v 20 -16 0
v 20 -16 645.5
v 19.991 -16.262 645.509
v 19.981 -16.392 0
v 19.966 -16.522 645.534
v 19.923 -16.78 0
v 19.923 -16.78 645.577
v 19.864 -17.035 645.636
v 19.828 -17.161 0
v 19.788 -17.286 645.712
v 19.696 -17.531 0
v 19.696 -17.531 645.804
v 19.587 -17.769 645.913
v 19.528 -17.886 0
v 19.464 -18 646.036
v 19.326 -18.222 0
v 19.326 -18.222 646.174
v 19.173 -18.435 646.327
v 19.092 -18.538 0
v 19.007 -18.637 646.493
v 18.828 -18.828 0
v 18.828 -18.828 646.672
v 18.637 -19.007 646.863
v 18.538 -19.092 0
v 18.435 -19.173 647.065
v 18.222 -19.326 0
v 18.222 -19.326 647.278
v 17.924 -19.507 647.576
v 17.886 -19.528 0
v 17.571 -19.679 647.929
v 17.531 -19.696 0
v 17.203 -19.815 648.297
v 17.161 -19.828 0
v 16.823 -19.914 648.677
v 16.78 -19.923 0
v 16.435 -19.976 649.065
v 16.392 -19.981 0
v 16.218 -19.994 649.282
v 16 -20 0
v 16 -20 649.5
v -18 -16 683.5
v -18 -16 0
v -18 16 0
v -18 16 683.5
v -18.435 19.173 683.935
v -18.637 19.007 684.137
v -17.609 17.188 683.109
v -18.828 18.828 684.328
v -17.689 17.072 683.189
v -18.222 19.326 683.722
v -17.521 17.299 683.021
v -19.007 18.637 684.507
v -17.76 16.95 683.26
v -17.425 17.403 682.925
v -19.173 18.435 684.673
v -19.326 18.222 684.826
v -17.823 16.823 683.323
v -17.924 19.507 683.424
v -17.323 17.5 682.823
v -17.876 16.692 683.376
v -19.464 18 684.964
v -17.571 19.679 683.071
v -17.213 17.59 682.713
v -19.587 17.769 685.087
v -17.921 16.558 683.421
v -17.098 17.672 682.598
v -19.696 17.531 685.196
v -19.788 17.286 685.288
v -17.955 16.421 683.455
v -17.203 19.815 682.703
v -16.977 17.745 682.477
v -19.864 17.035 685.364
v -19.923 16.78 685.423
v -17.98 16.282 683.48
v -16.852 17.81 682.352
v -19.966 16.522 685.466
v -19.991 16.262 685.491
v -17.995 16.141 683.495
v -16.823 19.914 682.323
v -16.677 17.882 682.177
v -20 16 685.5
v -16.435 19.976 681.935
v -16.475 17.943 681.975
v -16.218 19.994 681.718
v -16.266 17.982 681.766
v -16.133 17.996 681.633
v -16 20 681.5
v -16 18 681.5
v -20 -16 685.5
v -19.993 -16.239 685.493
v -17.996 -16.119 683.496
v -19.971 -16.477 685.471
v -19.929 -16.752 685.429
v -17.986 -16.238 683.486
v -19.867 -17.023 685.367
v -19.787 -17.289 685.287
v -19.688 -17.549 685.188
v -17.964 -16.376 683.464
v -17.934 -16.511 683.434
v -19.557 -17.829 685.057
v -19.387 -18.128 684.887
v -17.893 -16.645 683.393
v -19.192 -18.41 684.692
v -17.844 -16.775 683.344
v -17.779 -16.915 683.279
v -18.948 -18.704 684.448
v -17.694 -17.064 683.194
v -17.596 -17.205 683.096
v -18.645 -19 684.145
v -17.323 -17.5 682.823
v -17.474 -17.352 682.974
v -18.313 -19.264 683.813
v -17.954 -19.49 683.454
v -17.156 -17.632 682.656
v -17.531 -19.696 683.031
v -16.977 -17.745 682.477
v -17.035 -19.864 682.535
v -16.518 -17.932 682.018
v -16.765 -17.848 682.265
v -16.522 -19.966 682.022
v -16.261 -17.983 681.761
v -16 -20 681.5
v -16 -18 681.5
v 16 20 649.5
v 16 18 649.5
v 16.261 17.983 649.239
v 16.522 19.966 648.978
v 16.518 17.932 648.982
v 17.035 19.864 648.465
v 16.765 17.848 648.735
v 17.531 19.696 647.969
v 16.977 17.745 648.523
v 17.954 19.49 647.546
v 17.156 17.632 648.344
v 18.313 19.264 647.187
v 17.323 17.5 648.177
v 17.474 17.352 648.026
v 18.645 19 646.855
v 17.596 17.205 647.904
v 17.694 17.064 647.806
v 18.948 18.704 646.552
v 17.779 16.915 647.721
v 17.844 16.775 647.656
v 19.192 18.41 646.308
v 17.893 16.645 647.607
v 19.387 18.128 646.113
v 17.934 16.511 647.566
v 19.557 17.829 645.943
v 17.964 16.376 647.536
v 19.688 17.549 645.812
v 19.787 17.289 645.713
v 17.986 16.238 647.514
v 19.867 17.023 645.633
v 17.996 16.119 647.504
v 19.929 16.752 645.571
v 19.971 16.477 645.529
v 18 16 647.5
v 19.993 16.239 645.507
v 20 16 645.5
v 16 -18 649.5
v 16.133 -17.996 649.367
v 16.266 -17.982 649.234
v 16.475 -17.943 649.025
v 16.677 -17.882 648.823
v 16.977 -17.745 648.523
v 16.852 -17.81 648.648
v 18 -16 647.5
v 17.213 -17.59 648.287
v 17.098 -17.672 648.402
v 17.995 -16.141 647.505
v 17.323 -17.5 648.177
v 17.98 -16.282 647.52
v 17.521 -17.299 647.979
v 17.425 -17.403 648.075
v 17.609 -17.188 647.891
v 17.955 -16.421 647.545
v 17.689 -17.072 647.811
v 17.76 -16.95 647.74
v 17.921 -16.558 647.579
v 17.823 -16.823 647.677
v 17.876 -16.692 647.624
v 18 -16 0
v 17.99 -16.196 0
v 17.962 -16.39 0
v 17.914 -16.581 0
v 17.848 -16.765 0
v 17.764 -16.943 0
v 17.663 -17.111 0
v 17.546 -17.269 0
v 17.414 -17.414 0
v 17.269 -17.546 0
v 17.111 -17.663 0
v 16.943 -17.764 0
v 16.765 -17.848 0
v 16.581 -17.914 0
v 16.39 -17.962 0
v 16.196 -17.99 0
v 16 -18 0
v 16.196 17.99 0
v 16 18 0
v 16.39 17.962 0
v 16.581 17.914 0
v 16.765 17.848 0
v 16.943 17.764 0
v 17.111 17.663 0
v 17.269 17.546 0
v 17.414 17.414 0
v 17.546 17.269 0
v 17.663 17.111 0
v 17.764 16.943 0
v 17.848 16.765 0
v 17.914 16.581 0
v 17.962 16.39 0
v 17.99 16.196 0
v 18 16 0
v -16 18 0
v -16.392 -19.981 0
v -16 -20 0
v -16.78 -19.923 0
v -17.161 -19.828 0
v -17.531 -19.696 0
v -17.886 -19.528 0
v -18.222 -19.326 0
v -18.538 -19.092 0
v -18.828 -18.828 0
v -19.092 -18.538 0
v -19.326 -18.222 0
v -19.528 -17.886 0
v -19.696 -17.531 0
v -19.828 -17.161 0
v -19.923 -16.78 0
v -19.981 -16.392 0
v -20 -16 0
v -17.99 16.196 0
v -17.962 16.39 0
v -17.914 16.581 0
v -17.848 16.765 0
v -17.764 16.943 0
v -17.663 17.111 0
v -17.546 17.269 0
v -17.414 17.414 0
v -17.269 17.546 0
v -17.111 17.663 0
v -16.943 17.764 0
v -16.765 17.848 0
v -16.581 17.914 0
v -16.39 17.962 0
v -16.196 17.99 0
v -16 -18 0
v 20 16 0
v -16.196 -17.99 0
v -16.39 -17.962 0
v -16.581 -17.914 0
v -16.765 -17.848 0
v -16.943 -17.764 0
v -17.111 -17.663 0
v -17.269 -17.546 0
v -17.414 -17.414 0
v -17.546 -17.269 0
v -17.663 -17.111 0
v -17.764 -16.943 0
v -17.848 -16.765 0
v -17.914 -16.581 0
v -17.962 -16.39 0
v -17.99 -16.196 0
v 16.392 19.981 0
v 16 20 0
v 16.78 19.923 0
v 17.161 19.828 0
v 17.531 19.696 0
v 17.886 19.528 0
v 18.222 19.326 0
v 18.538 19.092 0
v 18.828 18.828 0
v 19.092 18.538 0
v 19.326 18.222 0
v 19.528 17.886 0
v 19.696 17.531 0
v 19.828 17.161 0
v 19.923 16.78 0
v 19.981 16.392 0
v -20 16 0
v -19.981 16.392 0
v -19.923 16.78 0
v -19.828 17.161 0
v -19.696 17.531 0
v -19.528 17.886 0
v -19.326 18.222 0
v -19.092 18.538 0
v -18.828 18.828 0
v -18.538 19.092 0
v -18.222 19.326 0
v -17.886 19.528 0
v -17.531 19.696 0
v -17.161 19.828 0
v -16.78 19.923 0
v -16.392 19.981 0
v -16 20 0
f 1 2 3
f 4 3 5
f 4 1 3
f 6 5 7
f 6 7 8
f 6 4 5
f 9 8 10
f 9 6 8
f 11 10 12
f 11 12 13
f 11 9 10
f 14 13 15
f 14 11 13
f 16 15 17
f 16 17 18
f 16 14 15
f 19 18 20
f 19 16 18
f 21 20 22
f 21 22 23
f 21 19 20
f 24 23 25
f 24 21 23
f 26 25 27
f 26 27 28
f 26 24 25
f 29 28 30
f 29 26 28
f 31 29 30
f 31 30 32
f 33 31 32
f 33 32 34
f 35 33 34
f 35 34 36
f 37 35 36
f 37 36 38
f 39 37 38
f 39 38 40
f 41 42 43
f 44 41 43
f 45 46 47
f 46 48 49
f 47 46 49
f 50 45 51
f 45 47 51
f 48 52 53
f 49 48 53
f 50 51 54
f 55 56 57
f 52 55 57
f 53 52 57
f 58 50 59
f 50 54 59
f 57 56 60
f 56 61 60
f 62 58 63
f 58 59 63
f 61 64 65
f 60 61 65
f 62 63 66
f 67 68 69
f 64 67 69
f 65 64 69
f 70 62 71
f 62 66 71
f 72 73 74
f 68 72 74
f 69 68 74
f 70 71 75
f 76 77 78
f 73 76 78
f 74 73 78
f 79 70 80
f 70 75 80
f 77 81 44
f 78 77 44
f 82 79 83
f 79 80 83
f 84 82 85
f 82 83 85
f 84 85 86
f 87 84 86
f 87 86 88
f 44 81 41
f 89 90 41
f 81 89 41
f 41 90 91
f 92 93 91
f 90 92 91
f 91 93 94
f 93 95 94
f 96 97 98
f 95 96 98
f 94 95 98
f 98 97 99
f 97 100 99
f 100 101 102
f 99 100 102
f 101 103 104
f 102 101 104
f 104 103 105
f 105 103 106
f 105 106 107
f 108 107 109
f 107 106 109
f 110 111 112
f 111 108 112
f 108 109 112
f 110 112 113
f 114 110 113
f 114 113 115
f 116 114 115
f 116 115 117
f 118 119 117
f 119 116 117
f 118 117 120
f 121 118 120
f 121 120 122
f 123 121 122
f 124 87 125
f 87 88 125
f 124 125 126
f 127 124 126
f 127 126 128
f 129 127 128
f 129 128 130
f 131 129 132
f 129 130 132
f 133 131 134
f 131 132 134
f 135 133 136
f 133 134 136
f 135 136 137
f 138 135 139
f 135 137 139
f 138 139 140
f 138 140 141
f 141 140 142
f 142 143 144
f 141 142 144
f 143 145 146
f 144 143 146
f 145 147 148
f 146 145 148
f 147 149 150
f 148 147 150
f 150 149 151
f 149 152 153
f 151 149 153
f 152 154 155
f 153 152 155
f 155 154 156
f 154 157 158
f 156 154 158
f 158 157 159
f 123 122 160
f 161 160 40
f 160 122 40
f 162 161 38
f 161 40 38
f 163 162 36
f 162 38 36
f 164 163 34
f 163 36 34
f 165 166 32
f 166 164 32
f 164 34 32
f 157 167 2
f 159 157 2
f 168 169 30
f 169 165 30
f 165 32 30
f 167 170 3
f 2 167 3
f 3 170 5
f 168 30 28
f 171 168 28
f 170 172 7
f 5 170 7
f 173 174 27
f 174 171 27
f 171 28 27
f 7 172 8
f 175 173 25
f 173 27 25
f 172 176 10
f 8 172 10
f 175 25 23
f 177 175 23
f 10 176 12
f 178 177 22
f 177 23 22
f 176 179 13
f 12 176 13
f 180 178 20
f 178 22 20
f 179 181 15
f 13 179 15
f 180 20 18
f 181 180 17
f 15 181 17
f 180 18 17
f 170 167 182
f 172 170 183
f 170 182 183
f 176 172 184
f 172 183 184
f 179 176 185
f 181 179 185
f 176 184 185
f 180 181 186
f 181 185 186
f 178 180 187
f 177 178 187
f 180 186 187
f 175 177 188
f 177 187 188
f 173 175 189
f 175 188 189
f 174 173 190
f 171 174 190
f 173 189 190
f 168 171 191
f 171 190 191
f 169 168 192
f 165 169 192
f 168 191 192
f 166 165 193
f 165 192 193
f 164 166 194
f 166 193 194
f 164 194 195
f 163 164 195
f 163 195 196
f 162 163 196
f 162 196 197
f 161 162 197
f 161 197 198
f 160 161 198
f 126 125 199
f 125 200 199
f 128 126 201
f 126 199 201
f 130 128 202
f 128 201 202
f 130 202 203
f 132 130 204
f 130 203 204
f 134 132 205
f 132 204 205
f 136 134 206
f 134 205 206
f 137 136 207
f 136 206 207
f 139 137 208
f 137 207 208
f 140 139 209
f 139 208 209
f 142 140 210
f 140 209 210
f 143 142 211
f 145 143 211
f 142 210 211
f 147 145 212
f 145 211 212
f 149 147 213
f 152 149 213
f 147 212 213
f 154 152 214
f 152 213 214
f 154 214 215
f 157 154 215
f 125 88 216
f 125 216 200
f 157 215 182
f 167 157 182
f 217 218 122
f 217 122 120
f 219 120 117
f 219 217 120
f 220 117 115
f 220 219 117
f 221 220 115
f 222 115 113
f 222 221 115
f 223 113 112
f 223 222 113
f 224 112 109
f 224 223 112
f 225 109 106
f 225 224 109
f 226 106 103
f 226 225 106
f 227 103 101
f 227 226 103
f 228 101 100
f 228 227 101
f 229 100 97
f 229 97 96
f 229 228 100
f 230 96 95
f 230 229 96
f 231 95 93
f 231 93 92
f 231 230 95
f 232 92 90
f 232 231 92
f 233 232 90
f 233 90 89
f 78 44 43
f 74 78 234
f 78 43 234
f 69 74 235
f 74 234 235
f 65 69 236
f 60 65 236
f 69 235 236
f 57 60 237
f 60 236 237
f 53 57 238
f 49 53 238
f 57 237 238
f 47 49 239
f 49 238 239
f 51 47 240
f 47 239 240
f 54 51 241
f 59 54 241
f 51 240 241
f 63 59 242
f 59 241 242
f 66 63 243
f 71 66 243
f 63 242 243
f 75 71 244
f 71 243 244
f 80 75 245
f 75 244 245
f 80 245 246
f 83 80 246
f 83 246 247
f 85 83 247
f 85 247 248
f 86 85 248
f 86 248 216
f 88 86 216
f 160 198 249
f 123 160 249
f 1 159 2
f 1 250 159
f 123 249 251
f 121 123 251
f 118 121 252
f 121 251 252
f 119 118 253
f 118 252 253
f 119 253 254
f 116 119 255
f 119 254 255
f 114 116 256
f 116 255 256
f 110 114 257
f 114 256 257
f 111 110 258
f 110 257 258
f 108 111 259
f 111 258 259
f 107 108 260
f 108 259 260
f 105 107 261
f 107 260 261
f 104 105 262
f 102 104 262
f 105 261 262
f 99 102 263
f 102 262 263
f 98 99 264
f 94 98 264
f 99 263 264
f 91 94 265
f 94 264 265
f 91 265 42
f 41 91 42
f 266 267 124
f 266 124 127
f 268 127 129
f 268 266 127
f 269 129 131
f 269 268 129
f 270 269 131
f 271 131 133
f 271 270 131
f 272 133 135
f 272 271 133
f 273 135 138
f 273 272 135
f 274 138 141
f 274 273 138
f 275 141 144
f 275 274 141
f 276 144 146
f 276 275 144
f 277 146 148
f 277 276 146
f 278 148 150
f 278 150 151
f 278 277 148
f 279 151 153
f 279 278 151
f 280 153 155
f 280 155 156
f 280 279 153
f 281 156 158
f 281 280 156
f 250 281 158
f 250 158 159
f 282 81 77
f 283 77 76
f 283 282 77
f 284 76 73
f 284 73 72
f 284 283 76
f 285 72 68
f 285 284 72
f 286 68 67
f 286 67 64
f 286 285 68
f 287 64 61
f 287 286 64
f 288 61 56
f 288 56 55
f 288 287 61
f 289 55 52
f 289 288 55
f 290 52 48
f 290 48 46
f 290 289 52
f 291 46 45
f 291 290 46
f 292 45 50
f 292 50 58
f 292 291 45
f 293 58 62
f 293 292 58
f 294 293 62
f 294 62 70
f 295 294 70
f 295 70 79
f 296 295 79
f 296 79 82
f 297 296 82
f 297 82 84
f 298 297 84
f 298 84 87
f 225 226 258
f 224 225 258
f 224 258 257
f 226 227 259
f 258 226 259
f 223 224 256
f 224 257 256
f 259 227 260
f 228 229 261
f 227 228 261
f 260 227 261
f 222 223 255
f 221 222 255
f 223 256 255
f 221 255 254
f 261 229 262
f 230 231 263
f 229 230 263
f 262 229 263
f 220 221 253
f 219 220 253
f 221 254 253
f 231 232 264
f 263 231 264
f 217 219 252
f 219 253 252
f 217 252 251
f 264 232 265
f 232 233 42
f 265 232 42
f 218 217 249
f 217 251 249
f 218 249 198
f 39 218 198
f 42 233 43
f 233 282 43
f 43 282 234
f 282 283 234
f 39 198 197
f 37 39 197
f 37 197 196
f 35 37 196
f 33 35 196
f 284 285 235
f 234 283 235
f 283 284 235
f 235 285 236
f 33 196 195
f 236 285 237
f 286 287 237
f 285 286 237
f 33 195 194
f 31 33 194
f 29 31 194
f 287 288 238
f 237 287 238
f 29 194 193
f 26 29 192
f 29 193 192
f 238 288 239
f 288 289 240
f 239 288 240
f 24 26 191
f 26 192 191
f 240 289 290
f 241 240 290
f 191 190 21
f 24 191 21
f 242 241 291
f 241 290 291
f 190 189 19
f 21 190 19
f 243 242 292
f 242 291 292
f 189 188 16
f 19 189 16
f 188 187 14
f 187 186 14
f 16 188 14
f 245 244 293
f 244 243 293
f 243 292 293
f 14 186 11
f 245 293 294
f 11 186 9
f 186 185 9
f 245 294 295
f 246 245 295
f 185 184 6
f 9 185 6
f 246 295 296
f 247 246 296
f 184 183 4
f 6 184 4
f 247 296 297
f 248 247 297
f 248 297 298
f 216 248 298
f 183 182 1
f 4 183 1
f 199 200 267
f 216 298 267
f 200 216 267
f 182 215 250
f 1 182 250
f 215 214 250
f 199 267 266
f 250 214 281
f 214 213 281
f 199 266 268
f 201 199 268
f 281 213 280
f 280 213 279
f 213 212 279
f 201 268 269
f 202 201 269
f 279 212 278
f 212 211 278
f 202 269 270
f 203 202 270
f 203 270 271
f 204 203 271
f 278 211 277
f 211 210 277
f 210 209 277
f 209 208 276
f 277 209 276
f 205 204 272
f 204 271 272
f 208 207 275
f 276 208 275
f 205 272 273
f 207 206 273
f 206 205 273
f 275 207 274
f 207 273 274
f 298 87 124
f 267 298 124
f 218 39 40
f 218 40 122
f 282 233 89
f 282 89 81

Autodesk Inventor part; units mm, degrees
ref_plane "YZ Plane" through (0, 0, 0) normal (1, 0, 0) x (0, 1, 0)
ref_plane "Piano iniziale" through (0, 0, 0) normal (0, 0, 1) x (1, 0, 0)
ref_plane "Piano finale" through (0, 0, 685.5) normal (0, 0, 1) x (1, 0, 0)
sketch "Schizzo" plane through (0, 0, 0) normal (0, 0, 1) x (1, 0, 0)
  line L0 (-20, -16) -> (-20, 16)
  line L1 (-16, 20) -> (16, 20)
  line L2 (20, 16) -> (20, -16)
  line L3 (16, -20) -> (-16, -20)
  arc A0 (-20, -16) -> (-16, -20) centre (-16, -16) ccw
  arc A1 (20, 16) -> (16, 20) centre (16, 16) ccw
  arc A2 (-16, 20) -> (-20, 16) centre (-16, 16) ccw
  arc A3 (16, -20) -> (20, -16) centre (16, -16) ccw
  arc A4 (-16, 18) -> (-18, 16) centre (-16, 16) ccw
  line L4 (-16, 18) -> (16, 18)
  arc A5 (18, 16) -> (16, 18) centre (16, 16) ccw
  line L5 (18, 16) -> (18, -16)
  arc A6 (16, -18) -> (18, -16) centre (16, -16) ccw
  line L6 (16, -18) -> (-16, -18)
  arc A7 (-18, -16) -> (-16, -18) centre (-16, -16) ccw
  line L7 (-18, -16) -> (-18, 16)
  line L8 (0, 29.1598) -> (0, -29.1598) construction
  line L9 (-29.1598, 0) -> (29.1598, 0) construction
  dimension "d7" = 4
  dimension "d9" = 40
  dimension "d11" = 40
  dimension "d12" = 2
  dimension "d15" = 20
  dimension "d16" = 20
extrude "Corpo" add sketch "Schizzo" along normal up to surface (685.5 mm away) from surface at 0
sketch "Sketch3" plane through (0, 0, 0) normal (0, 0, 1) x (1, 0, 0)
  line L0 (0, 0) -> (10, 0)
ref_plane "Work Plane3" through (0, 0, 0) normal (0, -1, 0) x (1, 0, 0)
sketch "Sketch4" plane through (0, 0, 0) normal (0, -1, 0) x (1, 0, 0)
  line L0 (-2, 0) -> (12, 0)
  line L1 (-2, 685.5) -> (12, 685.5)
  dimension "d18" = 685.5
sketch "Schizzo5" plane through (-16, -20, 0) normal (0, -1, 0) x (1, 0, 0)
  line L0 (-4, 0) -> (-4, 685.5) projected
  line L1 (-4, 685.5) -> (0, 685.5) projected
  line L2 (-4, 685.5) -> (40.4052, 641.0948)
  line L3 (-4, 685.5) -> (58.7984, 685.5) construction
  line L4 (40.4052, 641.0948) -> (40.4052, 697.863)
  line L5 (36, 0) -> (36, 685.5) projected
  line L6 (40.4052, 697.863) -> (-4, 685.5)
  point P0 (16, 0)
  dimension "d19" = 45
extrude "Estrusione2" cut sketch "Schizzo5" against normal up to next
equation "\"d7\" = G_IR"
equation "\"d9\" = G_W"
equation "\"d11\" = G_H"
equation "\"d12\" = G_T"
equation "\"d15\" = 0.5 * d9"
equation "\"d16\" = 0.5 * d11"
equation "\"d3\" = G_L"
equation "\"G_W\" = 40"
equation "\"G_H\" = 40"
equation "\"G_T\" = 2"
equation "\"G_IR\" = 4"
equation "\"G_L\" = d18"
equation "\"G_OFFSET_START\" = 0"
equation "\"G_OFFSET_END\" = 0"
equation "\"d14\" = G_OFFSET_END + B_L"
equation "\"B_L\" = 685.5"
properties part number "ISO 10799-2 - 40x40x2 - 685,5" material "Acciaio, Dolce"
